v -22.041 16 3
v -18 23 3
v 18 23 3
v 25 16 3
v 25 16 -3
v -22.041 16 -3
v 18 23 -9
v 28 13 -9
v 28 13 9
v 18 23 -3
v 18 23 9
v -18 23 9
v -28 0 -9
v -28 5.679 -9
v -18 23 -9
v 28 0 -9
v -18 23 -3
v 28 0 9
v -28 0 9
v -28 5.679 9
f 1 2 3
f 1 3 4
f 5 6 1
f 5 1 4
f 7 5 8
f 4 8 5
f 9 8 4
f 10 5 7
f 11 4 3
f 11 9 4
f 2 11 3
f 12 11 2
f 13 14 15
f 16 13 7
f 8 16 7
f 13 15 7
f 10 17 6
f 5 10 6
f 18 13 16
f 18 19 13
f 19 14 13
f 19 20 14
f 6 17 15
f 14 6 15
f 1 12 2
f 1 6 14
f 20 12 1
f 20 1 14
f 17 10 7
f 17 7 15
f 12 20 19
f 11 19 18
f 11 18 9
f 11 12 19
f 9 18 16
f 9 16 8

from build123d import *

# Parameters (mm, degrees)
BOSS_EXTRUDE1_DEPTH = 9
SKETCH2_W           = 206.758876678
SKETCH2_H           = 6
CUT_EXTRUDE1_DEPTH  = 7


with BuildPart() as part:
    # Sketch1 → Boss-Extrude1 (new, symmetric)
    with BuildSketch(Plane.XY):
        Polygon((-28, 0), (28, 0), (28, 13), (18, 23), (-18, 23), (-28, 5.679491924), align=None)
    extrude(amount=BOSS_EXTRUDE1_DEPTH, both=True)

    # Sketch2 → Cut-Extrude1 (cut)
    with BuildSketch(Plane(origin=(0, 23, 0), x_dir=(1, 0, 0), z_dir=(0, 1, 0))):
        Rectangle(SKETCH2_W, SKETCH2_H)
    extrude(amount=-CUT_EXTRUDE1_DEPTH, mode=Mode.SUBTRACT)


solid = part.part
